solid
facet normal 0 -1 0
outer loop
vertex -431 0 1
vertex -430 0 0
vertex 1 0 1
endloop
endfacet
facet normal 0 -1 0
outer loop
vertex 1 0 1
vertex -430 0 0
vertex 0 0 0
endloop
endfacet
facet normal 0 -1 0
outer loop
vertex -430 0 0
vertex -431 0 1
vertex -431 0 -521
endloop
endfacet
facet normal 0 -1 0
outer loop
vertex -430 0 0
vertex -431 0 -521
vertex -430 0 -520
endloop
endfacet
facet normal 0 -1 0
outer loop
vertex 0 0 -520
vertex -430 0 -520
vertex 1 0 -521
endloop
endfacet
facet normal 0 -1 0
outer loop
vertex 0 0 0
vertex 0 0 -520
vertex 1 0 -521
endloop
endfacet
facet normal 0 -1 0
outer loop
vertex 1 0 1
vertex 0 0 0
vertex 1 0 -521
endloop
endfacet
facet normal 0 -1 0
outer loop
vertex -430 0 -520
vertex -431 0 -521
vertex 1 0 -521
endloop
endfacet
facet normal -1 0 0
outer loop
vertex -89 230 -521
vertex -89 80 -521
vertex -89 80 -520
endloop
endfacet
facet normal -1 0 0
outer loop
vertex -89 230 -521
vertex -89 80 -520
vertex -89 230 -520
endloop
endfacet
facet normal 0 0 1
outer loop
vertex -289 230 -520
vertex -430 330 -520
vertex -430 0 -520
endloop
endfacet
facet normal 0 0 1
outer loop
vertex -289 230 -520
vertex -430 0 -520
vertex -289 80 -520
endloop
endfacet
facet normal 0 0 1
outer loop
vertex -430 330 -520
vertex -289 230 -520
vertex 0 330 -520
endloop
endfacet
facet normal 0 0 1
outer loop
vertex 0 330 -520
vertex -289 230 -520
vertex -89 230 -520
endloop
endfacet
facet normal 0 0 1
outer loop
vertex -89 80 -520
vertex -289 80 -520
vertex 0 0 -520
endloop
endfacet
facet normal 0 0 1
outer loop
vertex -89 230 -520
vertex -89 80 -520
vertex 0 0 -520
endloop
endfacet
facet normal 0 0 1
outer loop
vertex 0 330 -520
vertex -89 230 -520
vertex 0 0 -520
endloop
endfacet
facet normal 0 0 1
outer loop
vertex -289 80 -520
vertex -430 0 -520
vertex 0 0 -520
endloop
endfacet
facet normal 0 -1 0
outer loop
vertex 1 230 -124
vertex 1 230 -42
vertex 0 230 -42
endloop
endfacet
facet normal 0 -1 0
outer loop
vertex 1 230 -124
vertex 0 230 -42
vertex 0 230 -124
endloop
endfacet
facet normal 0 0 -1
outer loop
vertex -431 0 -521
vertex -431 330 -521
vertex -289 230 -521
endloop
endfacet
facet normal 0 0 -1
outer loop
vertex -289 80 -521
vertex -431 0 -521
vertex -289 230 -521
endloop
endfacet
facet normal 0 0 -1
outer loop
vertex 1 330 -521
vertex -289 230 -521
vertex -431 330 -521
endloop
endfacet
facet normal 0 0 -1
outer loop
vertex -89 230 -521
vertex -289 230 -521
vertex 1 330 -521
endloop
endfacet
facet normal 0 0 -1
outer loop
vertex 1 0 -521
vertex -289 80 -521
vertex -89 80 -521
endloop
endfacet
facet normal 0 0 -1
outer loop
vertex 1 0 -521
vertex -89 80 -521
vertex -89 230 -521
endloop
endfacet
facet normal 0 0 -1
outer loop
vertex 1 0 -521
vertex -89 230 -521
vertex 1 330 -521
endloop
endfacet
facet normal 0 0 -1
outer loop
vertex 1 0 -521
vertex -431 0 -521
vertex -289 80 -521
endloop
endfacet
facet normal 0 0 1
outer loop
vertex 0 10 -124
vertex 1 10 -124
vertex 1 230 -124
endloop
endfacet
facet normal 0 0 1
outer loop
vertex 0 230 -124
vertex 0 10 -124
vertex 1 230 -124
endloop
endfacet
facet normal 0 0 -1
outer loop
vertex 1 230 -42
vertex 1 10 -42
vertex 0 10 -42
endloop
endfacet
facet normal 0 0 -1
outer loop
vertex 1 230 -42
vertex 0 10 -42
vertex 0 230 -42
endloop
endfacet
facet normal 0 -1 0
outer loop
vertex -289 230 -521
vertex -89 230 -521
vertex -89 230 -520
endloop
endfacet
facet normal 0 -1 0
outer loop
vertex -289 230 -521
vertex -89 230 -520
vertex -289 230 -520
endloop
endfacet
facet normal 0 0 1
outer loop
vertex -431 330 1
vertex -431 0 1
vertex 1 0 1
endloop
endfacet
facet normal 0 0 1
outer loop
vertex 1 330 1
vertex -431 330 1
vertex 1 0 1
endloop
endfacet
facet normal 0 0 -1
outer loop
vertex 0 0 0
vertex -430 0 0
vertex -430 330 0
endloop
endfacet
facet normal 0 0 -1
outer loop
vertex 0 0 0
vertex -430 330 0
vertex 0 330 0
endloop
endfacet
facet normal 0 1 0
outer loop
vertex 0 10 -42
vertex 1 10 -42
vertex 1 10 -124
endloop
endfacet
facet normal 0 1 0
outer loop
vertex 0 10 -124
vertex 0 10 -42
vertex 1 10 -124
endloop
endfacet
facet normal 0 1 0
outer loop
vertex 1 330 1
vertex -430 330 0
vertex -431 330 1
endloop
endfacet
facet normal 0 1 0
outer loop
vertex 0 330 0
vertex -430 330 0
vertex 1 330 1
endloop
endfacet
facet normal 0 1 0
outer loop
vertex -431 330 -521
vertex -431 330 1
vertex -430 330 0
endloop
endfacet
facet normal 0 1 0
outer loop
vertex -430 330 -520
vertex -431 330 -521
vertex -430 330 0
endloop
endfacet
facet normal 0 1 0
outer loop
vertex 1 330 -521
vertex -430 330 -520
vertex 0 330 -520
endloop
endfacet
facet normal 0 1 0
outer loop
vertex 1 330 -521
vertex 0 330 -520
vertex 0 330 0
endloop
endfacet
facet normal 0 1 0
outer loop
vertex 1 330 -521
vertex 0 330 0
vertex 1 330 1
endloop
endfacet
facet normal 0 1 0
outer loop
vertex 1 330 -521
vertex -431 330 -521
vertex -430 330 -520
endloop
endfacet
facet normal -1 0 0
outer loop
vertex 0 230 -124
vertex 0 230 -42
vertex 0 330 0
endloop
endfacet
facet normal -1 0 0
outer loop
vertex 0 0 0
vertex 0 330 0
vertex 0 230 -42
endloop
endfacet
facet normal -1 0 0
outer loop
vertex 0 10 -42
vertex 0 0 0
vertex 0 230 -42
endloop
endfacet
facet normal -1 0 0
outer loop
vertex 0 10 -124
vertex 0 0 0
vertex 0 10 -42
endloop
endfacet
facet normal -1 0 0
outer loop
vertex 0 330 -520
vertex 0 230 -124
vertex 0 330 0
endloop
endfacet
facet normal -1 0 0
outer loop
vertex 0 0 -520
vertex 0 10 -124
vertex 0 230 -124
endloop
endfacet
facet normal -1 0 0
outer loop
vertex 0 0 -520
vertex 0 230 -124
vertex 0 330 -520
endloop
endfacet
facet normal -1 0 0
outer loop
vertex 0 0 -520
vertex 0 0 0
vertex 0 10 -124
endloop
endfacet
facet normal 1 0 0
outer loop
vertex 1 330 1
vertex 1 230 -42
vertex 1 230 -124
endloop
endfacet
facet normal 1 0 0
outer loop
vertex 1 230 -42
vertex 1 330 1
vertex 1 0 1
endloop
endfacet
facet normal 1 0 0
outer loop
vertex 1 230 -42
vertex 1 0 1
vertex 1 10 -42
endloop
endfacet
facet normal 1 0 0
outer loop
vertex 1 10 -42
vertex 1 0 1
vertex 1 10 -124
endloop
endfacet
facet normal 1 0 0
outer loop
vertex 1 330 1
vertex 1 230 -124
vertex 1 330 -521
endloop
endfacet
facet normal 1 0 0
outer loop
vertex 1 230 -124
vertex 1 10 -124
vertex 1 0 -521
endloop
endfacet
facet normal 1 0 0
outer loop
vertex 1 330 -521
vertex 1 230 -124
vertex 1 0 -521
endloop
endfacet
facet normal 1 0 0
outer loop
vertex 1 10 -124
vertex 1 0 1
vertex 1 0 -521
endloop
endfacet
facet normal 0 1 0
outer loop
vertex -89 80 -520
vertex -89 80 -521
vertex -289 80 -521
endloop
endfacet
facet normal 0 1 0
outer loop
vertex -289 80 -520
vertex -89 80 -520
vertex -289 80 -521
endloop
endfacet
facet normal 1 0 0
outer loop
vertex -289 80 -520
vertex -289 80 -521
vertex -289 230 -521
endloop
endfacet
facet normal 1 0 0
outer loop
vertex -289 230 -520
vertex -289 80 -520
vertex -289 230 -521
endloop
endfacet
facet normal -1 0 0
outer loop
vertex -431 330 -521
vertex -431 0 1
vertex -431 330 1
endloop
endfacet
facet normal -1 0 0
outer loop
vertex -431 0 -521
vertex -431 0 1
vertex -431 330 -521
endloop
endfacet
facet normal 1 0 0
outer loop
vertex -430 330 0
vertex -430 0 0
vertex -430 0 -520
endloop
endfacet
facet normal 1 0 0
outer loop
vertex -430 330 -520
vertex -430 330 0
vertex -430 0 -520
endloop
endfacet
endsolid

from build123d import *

# Parameters (mm, degrees)
SKETCH_1_W          = 432
SKETCH_1_H          = 522
SKETCH_1_W_2        = 430
SKETCH_1_H_2        = 520
EXTRUDE_2_DEPTH     = 330
SKETCH_2_W          = 82
SKETCH_2_H          = 220
CUT_EXTRUDE_2_DEPTH = 10
SKETCH_3_W          = 200
SKETCH_3_H          = 150
CUT_EXTRUDE_3_DEPTH = 10


with BuildPart() as part:
    # Эскиз1 → Вытянуть-Тонкостенный2 (new body)
    with BuildSketch(Plane(origin=(0, 0, 0), x_dir=(1, 0, 0), z_dir=(0, 1, 0))):
        with Locations((-215, 260)):
            Rectangle(SKETCH_1_W, SKETCH_1_H)
        with Locations((-215, 260)):
            Rectangle(SKETCH_1_W_2, SKETCH_1_H_2, mode=Mode.SUBTRACT)
    extrude(amount=EXTRUDE_2_DEPTH)

    # Эскиз2 → Вырез-Вытянуть2 (cut)
    with BuildSketch(Plane(origin=(1, 0, 0), x_dir=(0, 0, -1), z_dir=(1, 0, 0))):
        with Locations((83, 120)):
            Rectangle(SKETCH_2_W, SKETCH_2_H)
    extrude(amount=-CUT_EXTRUDE_2_DEPTH, mode=Mode.SUBTRACT)

    # Эскиз3 → Вырез-Вытянуть3 (cut)
    with BuildSketch(Plane(origin=(0, 0, -521), x_dir=(-1, 0, 0), z_dir=(0, 0, -1))):
        with Locations((189, 155)):
            Rectangle(SKETCH_3_W, SKETCH_3_H)
    extrude(amount=-CUT_EXTRUDE_3_DEPTH, mode=Mode.SUBTRACT)


solid = part.part
